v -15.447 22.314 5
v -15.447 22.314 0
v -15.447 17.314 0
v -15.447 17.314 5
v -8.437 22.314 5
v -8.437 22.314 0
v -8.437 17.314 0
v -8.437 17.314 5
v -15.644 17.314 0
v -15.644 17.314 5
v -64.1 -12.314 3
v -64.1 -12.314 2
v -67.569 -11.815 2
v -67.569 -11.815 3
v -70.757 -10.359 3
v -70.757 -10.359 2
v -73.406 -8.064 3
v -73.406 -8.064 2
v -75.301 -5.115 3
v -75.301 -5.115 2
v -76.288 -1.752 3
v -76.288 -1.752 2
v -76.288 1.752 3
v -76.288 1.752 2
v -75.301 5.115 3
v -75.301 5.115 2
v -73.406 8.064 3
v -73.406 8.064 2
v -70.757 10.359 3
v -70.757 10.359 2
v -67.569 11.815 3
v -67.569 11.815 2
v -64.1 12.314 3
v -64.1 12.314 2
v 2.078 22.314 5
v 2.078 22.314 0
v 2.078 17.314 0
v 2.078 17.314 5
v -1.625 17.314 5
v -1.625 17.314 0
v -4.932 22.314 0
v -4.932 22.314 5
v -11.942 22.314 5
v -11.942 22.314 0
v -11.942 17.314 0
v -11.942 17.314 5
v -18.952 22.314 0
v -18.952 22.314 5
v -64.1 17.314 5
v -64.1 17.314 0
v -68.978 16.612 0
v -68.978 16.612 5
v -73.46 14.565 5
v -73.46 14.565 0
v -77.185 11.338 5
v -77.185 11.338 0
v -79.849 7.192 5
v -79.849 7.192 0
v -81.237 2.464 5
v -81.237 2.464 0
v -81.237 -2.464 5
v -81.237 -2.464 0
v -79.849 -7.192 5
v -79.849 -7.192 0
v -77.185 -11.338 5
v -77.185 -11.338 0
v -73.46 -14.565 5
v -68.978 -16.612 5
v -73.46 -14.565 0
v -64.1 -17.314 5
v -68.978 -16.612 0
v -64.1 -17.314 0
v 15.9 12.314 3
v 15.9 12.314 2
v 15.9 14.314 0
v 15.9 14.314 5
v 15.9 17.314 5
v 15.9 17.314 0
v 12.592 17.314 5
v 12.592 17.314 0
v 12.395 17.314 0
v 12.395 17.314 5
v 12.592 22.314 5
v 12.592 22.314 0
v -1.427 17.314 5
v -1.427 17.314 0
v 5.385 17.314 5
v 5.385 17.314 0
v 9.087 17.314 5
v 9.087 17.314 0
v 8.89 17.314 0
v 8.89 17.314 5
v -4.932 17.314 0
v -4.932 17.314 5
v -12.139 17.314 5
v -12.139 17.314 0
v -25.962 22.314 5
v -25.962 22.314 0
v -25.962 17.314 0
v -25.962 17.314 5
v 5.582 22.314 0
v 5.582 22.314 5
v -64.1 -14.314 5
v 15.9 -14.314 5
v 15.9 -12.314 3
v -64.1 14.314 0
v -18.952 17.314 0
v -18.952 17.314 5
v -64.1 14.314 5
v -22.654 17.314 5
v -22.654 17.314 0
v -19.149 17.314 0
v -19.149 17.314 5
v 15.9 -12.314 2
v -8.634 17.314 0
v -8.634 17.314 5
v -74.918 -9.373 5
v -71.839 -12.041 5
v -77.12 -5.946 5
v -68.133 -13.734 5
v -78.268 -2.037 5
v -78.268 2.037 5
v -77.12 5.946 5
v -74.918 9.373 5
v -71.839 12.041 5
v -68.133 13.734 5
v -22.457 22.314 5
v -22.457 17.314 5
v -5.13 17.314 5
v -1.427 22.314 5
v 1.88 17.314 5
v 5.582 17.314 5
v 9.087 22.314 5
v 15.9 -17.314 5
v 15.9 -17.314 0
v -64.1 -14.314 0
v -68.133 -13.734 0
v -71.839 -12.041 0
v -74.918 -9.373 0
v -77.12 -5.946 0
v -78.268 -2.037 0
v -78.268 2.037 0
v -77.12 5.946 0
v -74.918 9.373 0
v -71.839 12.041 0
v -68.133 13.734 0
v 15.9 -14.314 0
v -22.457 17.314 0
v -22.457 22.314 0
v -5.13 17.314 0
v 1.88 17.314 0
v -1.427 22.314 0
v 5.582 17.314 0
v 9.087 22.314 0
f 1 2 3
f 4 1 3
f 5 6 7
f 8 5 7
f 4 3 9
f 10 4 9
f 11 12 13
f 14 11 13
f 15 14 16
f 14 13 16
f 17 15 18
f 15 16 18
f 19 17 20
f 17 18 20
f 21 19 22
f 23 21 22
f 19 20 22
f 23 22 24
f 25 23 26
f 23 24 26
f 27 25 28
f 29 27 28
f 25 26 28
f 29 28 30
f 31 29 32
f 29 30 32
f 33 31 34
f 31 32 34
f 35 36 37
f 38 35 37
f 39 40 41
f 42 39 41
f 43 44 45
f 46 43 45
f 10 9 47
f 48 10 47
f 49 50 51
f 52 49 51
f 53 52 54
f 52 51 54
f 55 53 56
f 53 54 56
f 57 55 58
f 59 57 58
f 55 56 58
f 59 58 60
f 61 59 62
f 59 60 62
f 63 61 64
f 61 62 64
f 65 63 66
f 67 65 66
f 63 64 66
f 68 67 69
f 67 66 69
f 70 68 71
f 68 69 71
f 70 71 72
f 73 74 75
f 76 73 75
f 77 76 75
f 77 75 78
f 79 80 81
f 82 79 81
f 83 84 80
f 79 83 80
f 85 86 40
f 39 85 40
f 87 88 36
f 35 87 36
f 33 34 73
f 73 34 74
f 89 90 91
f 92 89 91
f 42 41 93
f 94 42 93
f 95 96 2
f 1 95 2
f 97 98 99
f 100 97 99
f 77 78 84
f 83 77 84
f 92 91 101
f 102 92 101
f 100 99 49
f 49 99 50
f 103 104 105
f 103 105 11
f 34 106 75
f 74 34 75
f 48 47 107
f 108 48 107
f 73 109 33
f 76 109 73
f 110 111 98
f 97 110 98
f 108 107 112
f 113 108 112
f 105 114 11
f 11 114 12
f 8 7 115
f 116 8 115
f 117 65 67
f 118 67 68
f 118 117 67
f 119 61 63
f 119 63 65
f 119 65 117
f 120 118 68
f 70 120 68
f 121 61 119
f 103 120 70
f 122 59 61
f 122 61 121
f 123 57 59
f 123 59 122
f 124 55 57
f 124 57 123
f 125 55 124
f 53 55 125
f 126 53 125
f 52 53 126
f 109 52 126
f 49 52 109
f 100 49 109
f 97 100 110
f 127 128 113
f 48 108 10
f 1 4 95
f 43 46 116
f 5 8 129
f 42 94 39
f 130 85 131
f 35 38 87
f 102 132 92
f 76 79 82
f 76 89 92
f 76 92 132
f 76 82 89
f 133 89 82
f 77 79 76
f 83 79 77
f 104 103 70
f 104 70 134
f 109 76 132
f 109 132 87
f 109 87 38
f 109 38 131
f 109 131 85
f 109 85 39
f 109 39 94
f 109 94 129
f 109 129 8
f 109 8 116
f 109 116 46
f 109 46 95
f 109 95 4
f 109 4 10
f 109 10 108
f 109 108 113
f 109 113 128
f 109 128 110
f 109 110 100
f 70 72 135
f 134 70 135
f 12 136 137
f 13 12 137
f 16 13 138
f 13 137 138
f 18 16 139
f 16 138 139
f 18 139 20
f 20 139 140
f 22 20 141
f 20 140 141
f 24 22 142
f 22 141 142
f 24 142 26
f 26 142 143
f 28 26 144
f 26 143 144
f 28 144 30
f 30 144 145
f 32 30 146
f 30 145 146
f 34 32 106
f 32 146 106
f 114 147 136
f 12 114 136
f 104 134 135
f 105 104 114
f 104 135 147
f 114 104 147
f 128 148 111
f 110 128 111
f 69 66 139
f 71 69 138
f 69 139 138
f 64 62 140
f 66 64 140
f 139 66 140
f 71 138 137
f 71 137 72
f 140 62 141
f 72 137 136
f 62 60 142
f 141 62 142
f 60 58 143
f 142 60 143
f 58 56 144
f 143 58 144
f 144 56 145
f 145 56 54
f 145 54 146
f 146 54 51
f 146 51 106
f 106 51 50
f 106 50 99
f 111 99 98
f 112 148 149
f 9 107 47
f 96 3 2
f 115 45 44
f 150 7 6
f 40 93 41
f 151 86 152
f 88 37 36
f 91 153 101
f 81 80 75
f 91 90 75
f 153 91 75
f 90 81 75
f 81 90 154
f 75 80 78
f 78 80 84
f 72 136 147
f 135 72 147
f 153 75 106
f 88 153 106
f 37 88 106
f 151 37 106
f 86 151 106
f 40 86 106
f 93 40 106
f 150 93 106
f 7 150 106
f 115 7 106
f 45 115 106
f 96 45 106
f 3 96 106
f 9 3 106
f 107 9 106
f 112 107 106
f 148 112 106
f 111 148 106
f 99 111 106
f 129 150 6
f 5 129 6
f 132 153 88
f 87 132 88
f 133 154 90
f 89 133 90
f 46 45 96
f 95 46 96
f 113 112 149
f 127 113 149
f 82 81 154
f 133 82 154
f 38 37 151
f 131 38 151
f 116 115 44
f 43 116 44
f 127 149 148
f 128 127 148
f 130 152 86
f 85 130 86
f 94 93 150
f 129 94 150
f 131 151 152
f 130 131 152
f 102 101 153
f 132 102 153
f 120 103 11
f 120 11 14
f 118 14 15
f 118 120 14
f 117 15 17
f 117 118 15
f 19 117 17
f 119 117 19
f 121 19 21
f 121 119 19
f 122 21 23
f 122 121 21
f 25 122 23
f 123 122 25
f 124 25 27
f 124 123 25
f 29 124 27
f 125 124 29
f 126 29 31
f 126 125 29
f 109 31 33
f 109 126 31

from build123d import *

# Parameters (mm, degrees)
F1_DEPTH = 5
F2_SIZE  = 2


# Not quite as in the source:
# - a feature names something its author has since deleted; it is built from what else it names


with BuildPart() as f1:
    # F0 (on Top) → F1 (new body)
    with BuildSketch(Plane.XY):
        with BuildLine():
            ThreePointArc((-64.1, -12.3136591911), (-76.4136591911, 0), (-64.1, 12.3136591911))
            Line((-64.1, 12.3136591911), (0, 12.3136591911))
            Line((0, 12.3136591911), (15.9, 12.3136591911))
            Line((15.9, 12.3136591911), (15.9, 17.3136591911))
            Line((15.9, 17.3136591911), (12.5920902938, 17.3136591911))
            Line((12.5920902938, 17.3136591911), (12.395, 17.3136591911))
            Line((12.395, 17.3136591911), (9.0870902938, 17.3136591911))
            Line((9.0870902938, 17.3136591911), (8.89, 17.3136591911))
            Line((8.89, 17.3136591911), (5.5820902938, 17.3136591911))
            Line((5.5820902938, 17.3136591911), (5.3854580642, 17.3136591911))
            Line((5.3854580642, 17.3136591911), (2.077548358, 17.3136591911))
            Line((2.077548358, 17.3136591911), (1.8804580642, 17.3136591911))
            Line((1.8804580642, 17.3136591911), (0, 17.3136591911))
            Line((0, 17.3136591911), (-1.427451642, 17.3136591911))
            Line((-1.427451642, 17.3136591911), (-1.6245419358, 17.3136591911))
            Line((-1.6245419358, 17.3136591911), (-4.932451642, 17.3136591911))
            Line((-4.932451642, 17.3136591911), (-5.1295419358, 17.3136591911))
            Line((-5.1295419358, 17.3136591911), (-8.437451642, 17.3136591911))
            Line((-8.437451642, 17.3136591911), (-8.6340838715, 17.3136591911))
            Line((-8.6340838715, 17.3136591911), (-11.9419935778, 17.3136591911))
            Line((-11.9419935778, 17.3136591911), (-12.1390838715, 17.3136591911))
            Line((-12.1390838715, 17.3136591911), (-15.4469935778, 17.3136591911))
            Line((-15.4469935778, 17.3136591911), (-15.6440838715, 17.3136591911))
            Line((-15.6440838715, 17.3136591911), (-18.9519935778, 17.3136591911))
            Line((-18.9519935778, 17.3136591911), (-19.1490838715, 17.3136591911))
            Line((-19.1490838715, 17.3136591911), (-22.4569935778, 17.3136591911))
            Line((-22.4569935778, 17.3136591911), (-22.6536258073, 17.3136591911))
            Line((-22.6536258073, 17.3136591911), (-25.9615355136, 17.3136591911))
            Line((-25.9615355136, 17.3136591911), (-64.1, 17.3136591911))
            ThreePointArc((-64.1, 17.3136591911), (-81.4136591911, 0), (-64.1, -17.3136591911))
            Line((-64.1, -17.3136591911), (0, -17.3136591911))
            Line((0, -17.3136591911), (15.9, -17.3136591911))
            Line((15.9, -17.3136591911), (15.9, -12.3136591911))
            Line((15.9, -12.3136591911), (0, -12.3136591911))
            Line((0, -12.3136591911), (-64.1, -12.3136591911))
        make_face()
        Polygon((12.5920902938, 17.3136591911), (15.9, 17.3136591911), (12.5920902938, 22.3136591911), align=None)
        Polygon((9.0870902938, 17.3136591911), (12.395, 17.3136591911), (9.0870902938, 22.3136591911), align=None)
        Polygon((5.5820902938, 17.3136591911), (8.89, 17.3136591911), (5.5820902938, 22.3136591911), align=None)
        Polygon((2.077548358, 17.3136591911), (5.3854580642, 17.3136591911), (2.077548358, 22.3136591911), align=None)
        Polygon((0, 17.3136591911), (1.8804580642, 17.3136591911), (-1.427451642, 22.3136591911), (-1.427451642, 17.3136591911), align=None)
        Polygon((-4.932451642, 17.3136591911), (-1.6245419358, 17.3136591911), (-4.932451642, 22.3136591911), align=None)
        Polygon((-8.437451642, 17.3136591911), (-5.1295419358, 17.3136591911), (-8.437451642, 22.3136591911), align=None)
        Polygon((-11.9419935778, 22.3136591911), (-11.9419935778, 17.3136591911), (-8.6340838715, 17.3136591911), align=None)
        Polygon((-15.4469935778, 22.3136591911), (-15.4469935778, 17.3136591911), (-12.1390838715, 17.3136591911), align=None)
        Polygon((-18.9519935778, 22.3136591911), (-18.9519935778, 17.3136591911), (-15.6440838715, 17.3136591911), align=None)
        Polygon((-22.4569935778, 22.3136591911), (-22.4569935778, 17.3136591911), (-19.1490838715, 17.3136591911), align=None)
        Polygon((-25.9615355136, 22.3136591911), (-25.9615355136, 17.3136591911), (-22.6536258073, 17.3136591911), align=None)
    extrude(amount=F1_DEPTH)

    # F2
    f2_edges = [f1.edges().sort_by_distance(p)[0] for p in [
        (-76.413659, 0, 5),
        (-76.413659, 0, 0),
    ]]
    chamfer(f2_edges, length=F2_SIZE)


solid = f1.part
